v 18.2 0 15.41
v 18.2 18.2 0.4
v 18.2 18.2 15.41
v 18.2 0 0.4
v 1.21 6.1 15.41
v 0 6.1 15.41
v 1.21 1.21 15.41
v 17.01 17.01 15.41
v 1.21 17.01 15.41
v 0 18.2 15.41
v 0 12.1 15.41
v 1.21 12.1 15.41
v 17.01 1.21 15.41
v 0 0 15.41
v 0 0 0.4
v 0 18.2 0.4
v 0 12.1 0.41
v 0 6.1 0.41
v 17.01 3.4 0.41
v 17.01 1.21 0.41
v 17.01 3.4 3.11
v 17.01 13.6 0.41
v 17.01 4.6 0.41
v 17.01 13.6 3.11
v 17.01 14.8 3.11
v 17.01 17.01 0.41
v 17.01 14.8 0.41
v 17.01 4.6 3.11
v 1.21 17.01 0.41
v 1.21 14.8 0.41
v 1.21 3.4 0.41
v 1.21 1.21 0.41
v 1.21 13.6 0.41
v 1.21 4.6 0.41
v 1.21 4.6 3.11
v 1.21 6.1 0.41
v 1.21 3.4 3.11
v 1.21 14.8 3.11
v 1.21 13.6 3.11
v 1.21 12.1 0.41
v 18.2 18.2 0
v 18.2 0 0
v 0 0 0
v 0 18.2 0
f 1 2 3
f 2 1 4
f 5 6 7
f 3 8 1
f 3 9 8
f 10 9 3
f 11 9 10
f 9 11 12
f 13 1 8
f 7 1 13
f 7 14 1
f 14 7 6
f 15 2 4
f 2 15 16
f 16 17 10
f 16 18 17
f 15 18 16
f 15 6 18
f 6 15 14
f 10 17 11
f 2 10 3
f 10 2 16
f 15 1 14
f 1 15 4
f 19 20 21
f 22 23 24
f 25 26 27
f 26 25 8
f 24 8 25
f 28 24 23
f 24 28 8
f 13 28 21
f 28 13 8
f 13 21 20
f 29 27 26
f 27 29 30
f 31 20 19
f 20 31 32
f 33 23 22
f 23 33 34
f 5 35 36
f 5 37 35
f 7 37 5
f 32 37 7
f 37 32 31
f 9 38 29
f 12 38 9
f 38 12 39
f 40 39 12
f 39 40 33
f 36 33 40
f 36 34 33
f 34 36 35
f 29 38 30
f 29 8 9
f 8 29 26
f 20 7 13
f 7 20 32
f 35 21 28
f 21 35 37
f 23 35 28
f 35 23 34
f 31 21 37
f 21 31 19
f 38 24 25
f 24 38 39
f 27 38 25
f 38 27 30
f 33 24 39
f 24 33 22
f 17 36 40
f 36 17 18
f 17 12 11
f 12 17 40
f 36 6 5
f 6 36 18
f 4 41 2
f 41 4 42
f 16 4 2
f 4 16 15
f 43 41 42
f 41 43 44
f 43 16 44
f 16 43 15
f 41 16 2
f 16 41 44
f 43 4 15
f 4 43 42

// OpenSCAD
// file: ../../Base/Rotation.scad
// Fischertechnik Box Foundation
// Geometry Helpers Rotation

include <PlacementOptions.scad>

// getRotatedSpace(space, rotation=NoRotation)
// Rotates the space dependent on the specified rotation

function getRotatedSpace(space, rotation=NoRotation) = [
    (rotation == Rotate90 || rotation == Rotate270) ? space.y : space.x,
    (rotation == Rotate90 || rotation == Rotate270) ? space.x : space.y
];

// Rotates the given space around the fixed left lower corner
// space = the space the children needs as width/depth list [width,depth]
// rotation = 0 Rotate0 degrees, 1 Rotate90 degrees, 2 Rotate180 degrees, 3 Rotate270 degrees (equivalent to -90)

module RotateFix(space, rotation=NoRotation) {
    dy = (rotation == Rotate0 || rotation == Rotate270) ? 0 :
        (rotation == Rotate90) ? space.x :
        space.y;
    dx = (rotation < Rotate180) ? 0 :
        (rotation == Rotate180) ? space.x :
        space.y;
    
    translate([dx, dy, 0])
        rotate([0, 0, rotations[rotation]])
            children();
}
// file: ../../Base/Alignment.scad
// Fischertechnik Box Foundation
// Geometry Helpers Alignment

include <PlacementOptions.scad>

// getAlignedX(elementWidth, spaceWidth, align=AlignRight, offset=0)
// Gets the aligned X offset of an element with the given
// width in the given space.
// elementWidth = The width of the element to positon
// spaceWidth = The space where the element should be aligned
// align = 0 AlignLeft, 1 AlignCenter, 2 AlignRight
// offset = an optional offset from the aligned position. When
// aligned left or centered, then positive values are in X direction.
// When aligned right then positive values are in negative X direction.

function getAlignedX(elementWidth, spaceWidth, align=AlignRight, offset=0) =
    (align == AlignLeft) ?
        offset :
        ((align == AlignCenter) ?
        (spaceWidth - elementWidth)/2 + offset :
        spaceWidth - offset - elementWidth);

// getAlignedY(elementDepth, spaceDepth, align=AlignTop, offset=0)
// Gets the aligned Y offset of an element with the given
// depth in the given space.
// elementDepth = The depth of the element to positon
// spaceDepth = The space where the element should be aligned
// align = 0 AlignBottom, 1 AlignCenter, 2 AlignTop
// offset = an optional offset from the aligned position. When
// aligned bottom or centered, then positive values are in Y direction.
// When aligned top then positive values are in negative Y direction.

function getAlignedY(elementDepth, spaceDepth, align=AlignTop, offset=0) =
    (align == AlignBottom) ?
        offset :
        ((align == AlignCenter) ?
        (spaceDepth - elementDepth)/2 + offset :
        spaceDepth - offset - elementDepth);
// file: ../../Base/PlacementOptions.scad
// Fischertechnik Box Foundation
// Placement Options

// Alignment
NoAlign = 0;
AlignLeft = 1;
AlignBottom = 2;
AlignCenter = 3;
AlignRight = 4;
AlignTop = 5;

// Element rotation degree steps
rotations = [0, -90, -180, -270];

// Rotation
NoRotation = 0;
Rotate0 = 0;
Rotate90 = 1;
Rotate180 = 2;
Rotate270 = 3;

// Docking (seen from above)
NoDock = -1;
DockLeft = 0;
DockTop = 1;
DockRight = 2;
DockCorner = 2;
DockBottom = 3;

// Web corners
LowerLeft = 0;
UpperLeft = 1;
UpperRight = 2;
LowerRight = 3;

// Web position relative to corner
LeftOfCorner = 0;
RightOfCorner = 1;
// file: ../../Base/Boxes.scad
// Fischertechnik Box Foundation
// Pre-designed Boxes

use <Constants.scad>

include <PlacementOptions.scad>

box190Width = 190;
box190Depth = 130;
box130Width = 130;
box130Depth = 95;

// Values are from an original ec3 box
topBottomDifference = 1.5;
outerHeight = 40;
innerHeight = 38.2;
baseThickness = outerHeight - innerHeight;
stackExcess = 5.7;
radius = 3.5;
wallThickness = 1.5;
tolerance = 0.2;
stackOffset = innerHeight - stackExcess;

boxUsageHeight = stackOffset;
boxWallThickness = wallThickness;
boxBaseThickness = baseThickness;
boxWebWidth = 3.0;

// getBoxWallThickness()
// Gets the wall thickness of a Fischertechnik Box
function getBoxWallThickness() = boxWallThickness;

// getBoxUsageHeight()
// Gets the usable height of a Fischertechnik box
function getBoxUsageHeight() = boxUsageHeight;

// getBoxInnerHeight()
// Gets the inner height of a Fischertechnik box, including the stack excess
function getBoxInnerHeight() = innerHeight;

// getBoxBaseThickness()
// Gets the thickness of the Fischertechnik box base.
function getBoxBaseThickness() = boxBaseThickness;

// getBoxWebWidth()
// Gets the width of a box web
function getBoxWebWidth() = boxWebWidth;

// getBox190Space()
// Gets the usable inner space of a Box 190 as an x/y-list
function getBox190Space() = [
    box190Width - 2*getBoxWallThickness() - topBottomDifference, 
    box190Depth - 2*getBoxWallThickness() - topBottomDifference ];

// BoxBase(width, depth)
// Creates an empty stackable Fischertechnik compatible box
// width = Outer width of the box (190, 130, ...)
// depth = Outer depth of the box (130, 95, ...)

module BoxBase(width, depth, height=outerHeight) {    
    thinPlate = 0.01;

    innerHeight = height - baseThickness;    
    
    module BodyPlate(width, depth) {
        translate([radius, radius])
        hull() {
            w = width-2*radius;
            d = depth-2*radius;
            cube([w, d, thinPlate]);
            cylinder(thinPlate, r=radius, $fn=getFragments());
            translate([w, 0])
                cylinder(thinPlate, r=radius, $fn=getFragments());
            translate([w, d])
                cylinder(thinPlate, r=radius, $fn=getFragments());
            translate([0, d])
                cylinder(thinPlate, r=radius, $fn=getFragments());
        }
    }
    
    module Body(tolerance=tolerance) {
        hull() {
            // Bottom with tolerance to fit into the original boxes when stacked
            translate([-wallThickness+tolerance, -wallThickness+tolerance, -baseThickness])
                BodyPlate(width-topBottomDifference-2*tolerance, depth-topBottomDifference-2*tolerance);
            
            // Top
            translate([-wallThickness-topBottomDifference/2, -wallThickness-topBottomDifference/2, innerHeight-thinPlate])
                BodyPlate(width, depth);
         }
    }

    module Cutoff() {
        hull() {
            coWidth = width - 2*wallThickness;
            coDepth = depth - 2*wallThickness;
            
            // Bottom
            BodyPlate(coWidth-topBottomDifference, coDepth-topBottomDifference);

            // Top
            translate([-topBottomDifference/2, -topBottomDifference/2, innerHeight+thinPlate]) 
                BodyPlate(coWidth, coDepth);
        }
    }
    
    difference() {        
        Body();
        Cutoff();
        stackOffset = innerHeight - stackExcess;
        translate([0, 0, stackOffset + baseThickness])
            Body(tolerance=0);
    }
}

// Creates the Fischertechnik empty box 130x190 mm and places it at position 0,0
// 190x130 are the outer sizes, the inner space is slightly smaller. Use getBox190Space() to get the inner sizes.
// The box is positioned that the usable inner space is at the 0,0,0 position. The

module Box190() {
    BoxBase(box190Width, box190Depth);
}

// Gets the usable inner space of a Box 130 as an x/y-list
function getBox130Space() = [
    box130Width - 2*getBoxWallThickness() - topBottomDifference, 
    box130Depth - 2*getBoxWallThickness() - topBottomDifference ];

// Creates the Fischertechnik empty box 95x130 mm and places it at position 0,0
// 190x130 are the outer sizes, the inner space is slightly smaller. Use getBox190Space() to get the inner sizes.
// The box is positioned that the usable inner space is at the 0,0,0 position. The

module Box130() {
    BoxBase(box130Width, box130Depth);
}

// Creates a web at the specified box walls
// corner 0 = LowerLeft, 1 = UpperLeft, 2 = UpperRight, 3 = LowerRight
// side 0 = LeftOfCorner, 1 = RightOfCorner
// distance = Distance in mm from the corner
// boxSpace = inner width and depth of the box (default: Box 190)
// webWidth = length of the web (default is 3 mms)
// webThickness = thickness of the web (default is 1 mm)

module BoxWeb(corner, side, distance, boxSpace=getBox190Space(), webWidth=getBoxWebWidth(), webThickness=1.0) {
    sink = getBoxWallThickness()/2;

    width = (corner % 2 == 0) ? 
            (side == LeftOfCorner ? webWidth : webThickness) :
            (side == LeftOfCorner ? webThickness : webWidth);

    depth = (corner % 2 == 0) ? 
            (side == RightOfCorner ? webWidth : webThickness) :
            (side == RightOfCorner ? webThickness : webWidth);
    
    xDiff = corner == LowerLeft ? 
                (side == LeftOfCorner ? -sink : distance) :
            (corner == UpperLeft ?                
                (side == LeftOfCorner ? distance : -sink) :
            (corner == UpperRight ?
                (side == LeftOfCorner ? boxSpace.x-webWidth+sink : boxSpace.x-distance-webThickness) :
                (side == LeftOfCorner ? boxSpace.x-distance-webThickness: boxSpace.x-webWidth+sink)));

    yDiff = corner == LowerLeft ? 
                (side == RightOfCorner ? -sink : distance) :
            (corner == UpperLeft ?
                (side == RightOfCorner ? boxSpace.y-distance : boxSpace.y-webWidth+sink) :
            (corner == UpperRight ?
                (side == RightOfCorner ? boxSpace.y-webWidth+sink : boxSpace.y-distance) :
                (side == RightOfCorner ? distance : -sink)));
    
    translate([xDiff, yDiff, -getExcess()])
        cube([width, depth, boxUsageHeight + 2*getExcess()]);
}
// file: ../../Base/Placement.scad
// Fischertechnik Box Foundation
// Geometry Helpers Placement

use <Constants.scad>
use <Alignment.scad>
use <Rotation.scad>
use <Boxes.scad>

include <PlacementOptions.scad>

// Place(x=0, y=0, elementSpace=[0,0], alignX=AlignLeft, alignY=AlignBottom, rotation=Rotate0, boxSpace=getBox190Space())
// Places the child at the specified position
// y = Y-Position. This is a relative position when an X aligment is specified.
// x = X-Position. This is a relative position when an Y aligment is specified.
// elementSpace = space of the element to be placed [x,y]
// alignX = -1=NoAlign, 0 AlignLeft, 1 AlignCenter, 3 AlignRight (elementSpace and boxSpace required!)
// alignY = -1=NoAlign, 2 AlignBottom, 1 AlignCenter, 4 AlignTop (elementSpace and boxSpace required!)
// rotation = 0 Rotate0 0 degrees, 1 Rotate90 90 degrees, 
// 2 Rotate180 180 degrees, 3 Rotate270 270 degrees (equivalent to -90)
// boxSpace = Inner space of the box where the placement occurs [x,y] - default is Box 190x130 inner space

module Place(x=0, y=0, elementSpace=[0,0], 
  alignX=AlignLeft, alignY=AlignBottom, 
  rotation=NoRotation, boxSpace=getBox190Space()) {

    module Position(x, y, space, rotation=Rotate0) {
        translate([x, y, 0])
            RotateFix(space, rotation)
                children();
    }

    space = getRotatedSpace(elementSpace, rotation);
    alignedX = getAlignedX(space.x, boxSpace.x, alignX, x);
    alignedY = getAlignedY(space.y, boxSpace.y, alignY, y);
    Position(alignedX, alignedY, elementSpace, rotation)
        children();
}

// Center(space=getBox130Space(), elementSpace=[0,0])
// space = Space where the children is centered. For cylinder use centered=true and no elementSpace.
// elementSpace = space of the element to be centered [x,y]

module Center(space=getBox190Space(), elementSpace=[0,0]) {
    Place(elementSpace=elementSpace, boxSpace=space, alignX=AlignCenter, alignY=AlignCenter)
        children();
}

// CenterHorizontal(width=0, y=0, offset=0, space=getBox130Space())
// width = Width of the element to be placed.
// y = Y position of the element
// offset = Offset from the center position (negative will be left of the center)
// space = Space where the element is placed

module CenterHorizontal(width=0, y=0, offset=0, space=getBox190Space()) {
    Place(x=offset, y=y, elementSpace=[width, 0], boxSpace=space, alignX=AlignCenter)
        children(0);
}

// CenterVertical(depth=0, x=0, offset=0, space=getBox130Space())
// depth = Depth of the element to be placed.
// x = X position of the element
// offset = Offset from the center position (negative will be down of the center)
// space = Space where the element is placed

module CenterVertical(depth=0, x=0, offset=0, space=getBox190Space()) {
    Place(x=x, y=offset, elementSpace=[0, depth], boxSpace=space, alignY=AlignCenter)
        children(0);
}

// getIsVertical(align)
// True if the specified alignment needs a vertical orientation for a divider (AlignRight, AlignLeft)

function getIsVertical(align) = (align == AlignRight || align == AlignLeft);

// getIsHorizontal(align)
// True if the specified alignment needs a horizontal orientation for a divider (AlignTop, AlignBottom)

function getIsHorizontal(align) = (align == AlignTop || align == AlignBottom);
// file: ../../Elements/FrameBlockWithPin.scad
// Fischertechnik Box Library
// Frame for Building Blocks with Connector
// 38240, 37636

use <../Base/Constants.scad>
use <../ModelBase/Simple.scad>

width = 15;
depth = 15;
height = 8;

// getFrameBlockWithPinSpace()
// Gets the space the frame block with pin needs as width (.x and .y as a list)
// for the specified count of blocks

function getFrameBlockWithPinSpace(count = 1) = getFrameOuterVolume([width * count, depth, height]);

// FrameBlockWithPin(count, height=8)
// Frame for count standing building blocks with pin down
// count = Count of blocks
// height = Height of the frame (default is 8)

module FrameBlockWithPin(count = 1, height=height) {
    railWidth = getFrameBlockWithPinSpace(count).x;
    railHeight = 2.7;
    railDistance = 9;
    
    module Rails() {
        Wall([railWidth, getDividerThickness(), railHeight]);
        translate([0, railDistance + getDividerThickness()])
            Wall([railWidth, getDividerThickness(), railHeight]);
    }

    Frame([width*count, depth, height]);

    railsDepth = railDistance + 2*getDividerThickness();

    translate([0, (getFrameBlockWithPinSpace(count).y - railsDepth) / 2]) 
        Rails();
}

// Test
count = 2;
color("lightgray") {
FrameBlockWithPin(count);
}
// file: ../../Elements/AxisClip10.scad
// Fischertechnik Box Library
// Axis for clip 10
// 31023

use <../ModelBase/Simple.scad>
use <../Base/Constants.scad>

width = 12;
depth = 12;
height = 23;
upperDiameter = 3.6;
clipHeight = 10;

// getAxisClip10Space()
// Gets the space of a frame for a clip 10 with spring ring (mot2)

function getAxisClip10Space() = [width, depth, height];

// AxisClip10(height, clipHeight)
// Axis for clip 10 with spring ring (mot2)
// height = Height of the complete axis
// clipHeight = Height of the rt for the clip (standard is 10, in mot3 its only 7)

module AxisClip10(height=height, clipHeight=clipHeight) {
    LeveledAxisWithSpace(height, height-clipHeight, getAxisClip10Space(), diameter=upperDiameter);
}

// Tests
color("lightgray")
AxisClip10();
// file: ../../Base/Constants.scad
// Fischertechnik Box Foundation
// Constants

// Constant values necessary for multiple elements

// Base constants
dividerThickness = 1.2;
excess = 0.01;
fragments = 90;
tolerance = 0.8;

// Gets the thickness of a divider 
function getDividerThickness() = dividerThickness;

// Gets the excess that is used to merge walls into each other
function getExcess() = excess;

// Gets amount of fragments of a cylinder
function getFragments() = fragments;

// Gets the inner tolerance of a frame to each side
function getTolerance() = tolerance;


// Fischertechnik specific constants
axisDiameter = 4;
axisBottomDiameter = axisDiameter + 1;
standardEdgeDistance = 2.5;
standardWebDistance = 11.5;
standardCornerLength = 15;
tubeWallFactor = 0.8;
smallPartsFrameHeight = 20;

// Gets axis diameter
function getAxisDiameter() = axisDiameter;

// Gets axis bottom diameter for thicker part at the bottom
function getAxisBottomDiameter() = axisBottomDiameter;

// gets the standard distance to the wall of the box for dockable frames with webs
function getStandardEdgeDistance() = standardEdgeDistance;

// gets the standard distance of each web to the corner of the dockable frame
function getStandardWebDistance() = standardWebDistance;

// gets the standard length of the corner walls of a dockable frame
function getStandardCornerLength() = standardCornerLength;

// gets the wall thickness of a tube.
function getTubeWallThickness() = tubeWallFactor * getDividerThickness();

// gets the frame height for docked small parts boxes.
function getSmallPartsFrameHeight() = smallPartsFrameHeight;
// file: ../../Elements/FramePhotoResistor30.scad
// Fischertechnik Box Library
// Frame for Light Resistor 30
// 31361

use <../Base/Constants.scad>
use <../ModelBase/Simple.scad>
use <FrameBlockWithPin.scad>

width = 15;
depth = 15;
height = 15;

// getFramePhotoResistor30Space()
// Gets the space the frame for photo resistor 30 needs as width (.x and .y as a list)

function getFramePhotoResistor30Space() = getFrameOuterVolume([width, depth, height]);

// FramePhotoResistor30()
// Frame for photo resistor 30

module FramePhotoResistor30() {
    gapWidth = 6;
    
    difference() {
        FrameBlockWithPin(height=height);
        translate([-getDividerThickness()/2,(getFramePhotoResistor30Space().y-gapWidth)/2])
            cube([getDividerThickness()*2, gapWidth, height + 1]);
    }
}

// Test
color("lightgray") {
    FramePhotoResistor30();
}
// file: ../TestPrint.scad
// 3D Print Test Base

use <../Base/Constants.scad>

use <../Elements/AxisClip10.scad>

module TestPrint(elementSpace) {
    cube([elementSpace.x, elementSpace.y, 0.4]);
    translate([0,0,0.4+getExcess()]) {
        children();
    }
}

TestPrint(getAxisClip10Space())
    AxisClip10();
// main file
// 3D Print Test
// FramePhotoResistor30

use <../TestPrint.scad>
use <../../Elements/FramePhotoResistor30.scad>

TestPrint(getFramePhotoResistor30Space())
    FramePhotoResistor30();
